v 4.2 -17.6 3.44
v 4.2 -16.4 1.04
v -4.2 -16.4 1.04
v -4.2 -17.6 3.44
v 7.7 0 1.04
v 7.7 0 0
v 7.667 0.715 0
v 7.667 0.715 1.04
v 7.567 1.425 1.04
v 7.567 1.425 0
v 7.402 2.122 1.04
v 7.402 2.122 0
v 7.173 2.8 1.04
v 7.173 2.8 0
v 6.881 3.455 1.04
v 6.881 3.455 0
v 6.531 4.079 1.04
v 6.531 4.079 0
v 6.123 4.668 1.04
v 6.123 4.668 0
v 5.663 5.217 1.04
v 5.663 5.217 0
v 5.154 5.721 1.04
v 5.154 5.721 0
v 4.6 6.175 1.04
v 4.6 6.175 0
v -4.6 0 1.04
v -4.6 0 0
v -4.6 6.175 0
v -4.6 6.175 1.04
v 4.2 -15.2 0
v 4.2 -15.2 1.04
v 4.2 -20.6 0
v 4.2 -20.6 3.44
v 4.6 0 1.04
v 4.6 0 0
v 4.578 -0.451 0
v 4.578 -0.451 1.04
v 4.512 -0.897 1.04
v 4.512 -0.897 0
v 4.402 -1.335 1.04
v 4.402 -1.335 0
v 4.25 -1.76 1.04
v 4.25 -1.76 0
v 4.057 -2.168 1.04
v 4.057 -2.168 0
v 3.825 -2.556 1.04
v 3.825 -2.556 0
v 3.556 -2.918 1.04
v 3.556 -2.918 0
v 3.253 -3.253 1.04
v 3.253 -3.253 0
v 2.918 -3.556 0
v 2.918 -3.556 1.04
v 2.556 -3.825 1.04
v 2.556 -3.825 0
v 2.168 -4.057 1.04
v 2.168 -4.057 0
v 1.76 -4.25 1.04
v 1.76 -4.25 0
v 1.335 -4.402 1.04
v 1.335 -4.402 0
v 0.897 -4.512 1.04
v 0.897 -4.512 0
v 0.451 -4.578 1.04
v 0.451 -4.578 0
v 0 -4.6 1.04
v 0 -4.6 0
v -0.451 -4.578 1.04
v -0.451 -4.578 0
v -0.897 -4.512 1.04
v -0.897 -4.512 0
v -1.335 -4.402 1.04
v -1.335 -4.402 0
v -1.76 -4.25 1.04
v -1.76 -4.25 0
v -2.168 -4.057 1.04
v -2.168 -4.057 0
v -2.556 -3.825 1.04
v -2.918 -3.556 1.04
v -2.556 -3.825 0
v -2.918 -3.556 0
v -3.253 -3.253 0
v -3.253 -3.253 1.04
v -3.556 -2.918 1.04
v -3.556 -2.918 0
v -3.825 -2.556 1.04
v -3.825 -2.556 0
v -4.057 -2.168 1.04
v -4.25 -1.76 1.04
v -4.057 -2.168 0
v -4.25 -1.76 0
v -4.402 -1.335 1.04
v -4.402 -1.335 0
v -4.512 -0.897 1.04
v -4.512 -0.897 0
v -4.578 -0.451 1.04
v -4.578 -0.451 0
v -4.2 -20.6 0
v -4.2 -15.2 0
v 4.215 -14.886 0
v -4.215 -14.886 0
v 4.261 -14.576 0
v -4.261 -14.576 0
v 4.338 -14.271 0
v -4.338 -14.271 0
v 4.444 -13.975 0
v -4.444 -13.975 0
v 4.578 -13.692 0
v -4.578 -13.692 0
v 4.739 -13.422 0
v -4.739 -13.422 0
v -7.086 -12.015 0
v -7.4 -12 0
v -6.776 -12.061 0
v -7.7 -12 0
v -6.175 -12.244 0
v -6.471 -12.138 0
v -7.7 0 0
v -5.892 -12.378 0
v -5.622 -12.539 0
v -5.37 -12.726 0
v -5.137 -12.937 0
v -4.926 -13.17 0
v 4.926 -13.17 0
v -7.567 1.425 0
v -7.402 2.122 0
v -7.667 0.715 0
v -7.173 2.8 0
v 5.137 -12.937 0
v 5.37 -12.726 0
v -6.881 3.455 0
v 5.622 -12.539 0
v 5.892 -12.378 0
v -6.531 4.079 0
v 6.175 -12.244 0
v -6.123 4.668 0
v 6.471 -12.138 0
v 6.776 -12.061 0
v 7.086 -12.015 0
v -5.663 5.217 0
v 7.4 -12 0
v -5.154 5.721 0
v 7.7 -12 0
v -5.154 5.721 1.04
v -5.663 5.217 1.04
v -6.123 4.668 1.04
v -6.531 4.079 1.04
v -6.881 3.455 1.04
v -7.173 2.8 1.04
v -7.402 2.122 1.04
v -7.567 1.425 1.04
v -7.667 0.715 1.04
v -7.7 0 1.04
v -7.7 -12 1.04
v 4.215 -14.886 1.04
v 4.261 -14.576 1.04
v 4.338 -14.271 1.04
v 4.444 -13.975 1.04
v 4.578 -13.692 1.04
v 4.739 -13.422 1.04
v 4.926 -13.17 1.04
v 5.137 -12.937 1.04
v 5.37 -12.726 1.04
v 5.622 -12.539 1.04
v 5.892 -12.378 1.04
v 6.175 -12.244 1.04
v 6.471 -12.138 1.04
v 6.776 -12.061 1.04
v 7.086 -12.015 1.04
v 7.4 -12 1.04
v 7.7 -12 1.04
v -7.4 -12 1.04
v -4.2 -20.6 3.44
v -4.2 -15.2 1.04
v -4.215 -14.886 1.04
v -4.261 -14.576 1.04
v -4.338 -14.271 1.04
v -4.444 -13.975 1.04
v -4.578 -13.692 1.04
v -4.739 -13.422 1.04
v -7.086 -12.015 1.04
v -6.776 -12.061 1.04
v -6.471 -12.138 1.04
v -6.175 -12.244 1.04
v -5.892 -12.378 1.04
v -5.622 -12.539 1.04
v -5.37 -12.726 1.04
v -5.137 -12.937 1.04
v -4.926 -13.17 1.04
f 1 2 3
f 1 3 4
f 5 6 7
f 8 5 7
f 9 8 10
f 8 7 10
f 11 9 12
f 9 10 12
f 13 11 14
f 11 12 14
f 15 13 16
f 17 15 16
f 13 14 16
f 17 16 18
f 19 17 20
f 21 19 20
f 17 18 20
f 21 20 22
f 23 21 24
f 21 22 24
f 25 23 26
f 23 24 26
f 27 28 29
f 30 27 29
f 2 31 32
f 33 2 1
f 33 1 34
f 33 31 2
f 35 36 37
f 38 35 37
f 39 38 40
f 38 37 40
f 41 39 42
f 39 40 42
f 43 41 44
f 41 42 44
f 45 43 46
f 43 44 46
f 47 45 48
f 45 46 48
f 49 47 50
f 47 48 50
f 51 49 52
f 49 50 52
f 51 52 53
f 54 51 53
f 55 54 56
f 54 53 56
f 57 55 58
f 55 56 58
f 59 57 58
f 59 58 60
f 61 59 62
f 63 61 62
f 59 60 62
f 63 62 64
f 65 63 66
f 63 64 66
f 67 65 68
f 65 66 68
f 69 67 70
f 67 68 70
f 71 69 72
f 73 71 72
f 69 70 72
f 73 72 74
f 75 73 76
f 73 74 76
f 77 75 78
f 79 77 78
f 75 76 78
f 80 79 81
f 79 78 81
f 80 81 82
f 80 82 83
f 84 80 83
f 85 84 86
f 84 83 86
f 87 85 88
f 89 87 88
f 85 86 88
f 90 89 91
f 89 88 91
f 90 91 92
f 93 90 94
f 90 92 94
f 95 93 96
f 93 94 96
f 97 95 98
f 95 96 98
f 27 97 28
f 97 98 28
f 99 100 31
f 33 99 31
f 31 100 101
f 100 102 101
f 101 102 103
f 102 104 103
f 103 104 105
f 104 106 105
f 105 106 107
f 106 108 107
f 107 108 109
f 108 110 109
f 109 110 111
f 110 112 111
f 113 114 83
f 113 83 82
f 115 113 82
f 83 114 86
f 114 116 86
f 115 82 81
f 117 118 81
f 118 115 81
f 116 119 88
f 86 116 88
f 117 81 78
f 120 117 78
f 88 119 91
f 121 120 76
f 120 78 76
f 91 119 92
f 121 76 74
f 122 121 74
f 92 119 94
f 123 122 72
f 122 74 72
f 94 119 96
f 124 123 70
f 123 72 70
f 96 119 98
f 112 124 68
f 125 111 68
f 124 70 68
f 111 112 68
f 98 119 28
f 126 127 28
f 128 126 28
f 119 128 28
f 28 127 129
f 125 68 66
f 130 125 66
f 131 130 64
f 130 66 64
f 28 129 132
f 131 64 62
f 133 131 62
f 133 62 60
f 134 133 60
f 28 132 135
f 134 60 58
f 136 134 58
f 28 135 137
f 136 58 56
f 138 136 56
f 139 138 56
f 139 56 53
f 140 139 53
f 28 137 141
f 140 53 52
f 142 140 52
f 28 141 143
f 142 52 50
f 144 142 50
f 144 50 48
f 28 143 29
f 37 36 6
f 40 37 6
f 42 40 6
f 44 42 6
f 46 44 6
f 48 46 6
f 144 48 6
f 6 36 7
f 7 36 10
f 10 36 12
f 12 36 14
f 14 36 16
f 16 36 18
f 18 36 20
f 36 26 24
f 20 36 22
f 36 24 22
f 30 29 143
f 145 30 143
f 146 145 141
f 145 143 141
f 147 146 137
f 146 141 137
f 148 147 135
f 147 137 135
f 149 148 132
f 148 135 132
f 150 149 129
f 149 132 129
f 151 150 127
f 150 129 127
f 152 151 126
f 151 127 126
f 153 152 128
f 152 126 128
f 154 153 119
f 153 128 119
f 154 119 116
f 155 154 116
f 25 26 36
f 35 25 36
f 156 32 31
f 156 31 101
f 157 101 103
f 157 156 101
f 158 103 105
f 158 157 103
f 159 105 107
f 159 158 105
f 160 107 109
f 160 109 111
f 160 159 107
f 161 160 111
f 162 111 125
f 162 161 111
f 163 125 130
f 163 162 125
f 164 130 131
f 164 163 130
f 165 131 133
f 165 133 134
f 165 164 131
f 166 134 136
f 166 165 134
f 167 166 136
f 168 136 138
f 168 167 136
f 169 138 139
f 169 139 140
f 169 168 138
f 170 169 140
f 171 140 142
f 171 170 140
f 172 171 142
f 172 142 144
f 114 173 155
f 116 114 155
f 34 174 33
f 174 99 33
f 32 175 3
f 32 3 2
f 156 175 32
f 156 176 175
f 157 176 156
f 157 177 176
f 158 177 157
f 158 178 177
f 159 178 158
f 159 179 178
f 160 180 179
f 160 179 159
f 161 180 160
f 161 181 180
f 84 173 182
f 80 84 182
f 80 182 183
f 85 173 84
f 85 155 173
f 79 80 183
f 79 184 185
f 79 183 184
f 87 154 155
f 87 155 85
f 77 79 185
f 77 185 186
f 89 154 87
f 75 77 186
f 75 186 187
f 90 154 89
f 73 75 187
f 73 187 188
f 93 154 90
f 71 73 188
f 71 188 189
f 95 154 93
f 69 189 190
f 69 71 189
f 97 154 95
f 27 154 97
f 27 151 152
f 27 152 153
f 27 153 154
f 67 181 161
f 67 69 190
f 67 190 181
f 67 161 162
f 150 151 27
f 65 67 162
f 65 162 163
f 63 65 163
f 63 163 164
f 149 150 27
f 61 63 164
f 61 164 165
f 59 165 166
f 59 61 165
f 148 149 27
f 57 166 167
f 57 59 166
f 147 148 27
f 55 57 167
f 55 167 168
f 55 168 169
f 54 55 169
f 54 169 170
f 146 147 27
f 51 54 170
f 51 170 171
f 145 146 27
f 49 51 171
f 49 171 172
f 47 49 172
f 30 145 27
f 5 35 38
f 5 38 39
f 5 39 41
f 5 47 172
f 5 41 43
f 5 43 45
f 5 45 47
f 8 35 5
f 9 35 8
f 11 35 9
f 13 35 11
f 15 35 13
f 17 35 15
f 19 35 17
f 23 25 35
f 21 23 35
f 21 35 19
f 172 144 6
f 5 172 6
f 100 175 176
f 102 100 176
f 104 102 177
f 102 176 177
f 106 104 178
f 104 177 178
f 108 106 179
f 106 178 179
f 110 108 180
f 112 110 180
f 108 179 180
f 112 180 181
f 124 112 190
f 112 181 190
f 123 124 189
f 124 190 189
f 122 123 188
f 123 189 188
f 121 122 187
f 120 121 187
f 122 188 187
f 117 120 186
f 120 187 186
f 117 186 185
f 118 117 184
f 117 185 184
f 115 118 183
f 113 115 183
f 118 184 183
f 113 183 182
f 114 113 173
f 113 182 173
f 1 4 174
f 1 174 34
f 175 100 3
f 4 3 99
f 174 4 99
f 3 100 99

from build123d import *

# Parameters (mm, degrees)
EXTRUDE_1_DEPTH     = 1.04
CUT_EXTRUDE_1_DEPTH = 1.04
SKETCH_4_W          = 8.4
SKETCH_4_H          = 3
EXTRUDE_2_DEPTH     = 2.4
CHAMFER_1_SIZE      = 1.2
CHAMFER_1_SIZE_2    = 2.4


with BuildPart() as part:
    # Эскиз1 → Бобышка-Вытянуть1 (new body)
    with BuildSketch(Plane.XY):
        with BuildLine():
            Line((-4.6, 0), (-4.6, 6.174949393))
            ThreePointArc((-4.6, 6.174949393), (-6.88149693, 3.454706934), (-7.7, 0))
            Line((-7.7, 0), (-7.7, -20.6))
            Line((-7.7, -20.6), (7.7, -20.6))
            Line((7.7, -20.6), (7.7, 0))
            ThreePointArc((7.7, 0), (6.88149693, 3.454706934), (4.6, 6.174949393))
            Line((4.6, 6.174949393), (4.6, 0))
            ThreePointArc((4.6, 0), (0, -4.6), (-4.6, 0))
        make_face()
    extrude(amount=EXTRUDE_1_DEPTH)

    # Эскиз3 → Вырез-Вытянуть1 (cut)
    with BuildSketch(Plane.XY.offset(1.04)):
        with BuildLine():
            Line((-7.7, -20.6), (-4.2, -20.6))
            Line((-4.2, -20.6), (-4.2, -15.2))
            ThreePointArc((-4.2, -15.2), (-5.1372583, -12.9372583), (-7.4, -12))
            Line((-7.4, -12), (-7.7, -12))
            Line((-7.7, -12), (-7.7, -20.6))
        make_face()
        with BuildLine():
            Line((4.2, -20.6), (4.2, -15.2))
            ThreePointArc((4.2, -15.2), (5.1372583, -12.9372583), (7.4, -12))
            Line((7.4, -12), (7.7, -12))
            Line((7.7, -12), (7.7, -20.6))
            Line((7.7, -20.6), (4.2, -20.6))
        make_face()
    extrude(amount=-CUT_EXTRUDE_1_DEPTH, mode=Mode.SUBTRACT)

    # Эскиз4 → Бобышка-Вытянуть2 (add)
    with BuildSketch(Plane.XY.offset(1.04)):
        with Locations((0, -19.1)):
            Rectangle(SKETCH_4_W, SKETCH_4_H)
    extrude(amount=EXTRUDE_2_DEPTH)

    # Фаска1
    # the kernel refuses this chamfer: 2.4, 1.2 mm, written as the material it adds along each edge
    with BuildSketch(Plane(origin=(4.2, -17.6, 1.04), x_dir=(0, 0.9976223042390325, -0.06891834360170876), z_dir=(-1, 0, 0))) as chamfer_1_piece_1_section:
        Polygon((CHAMFER_1_SIZE * 0.997622304239, -CHAMFER_1_SIZE * 0.0689183436017), (-CHAMFER_1_SIZE_2 * 0.0689183436017, -CHAMFER_1_SIZE_2 * 0.997622304239), (0, 0), align=None)
    chamfer_1_piece_1 = extrude(amount=8.4, mode=Mode.PRIVATE)
    chamfer_1_piece_1 = split(chamfer_1_piece_1, bisect_by=Plane(origin=(0, -17.217816218, 3.44), z_dir=(0, 0, -1)), keep=Keep.TOP, mode=Mode.PRIVATE)
    add(chamfer_1_piece_1)


solid = part.part
